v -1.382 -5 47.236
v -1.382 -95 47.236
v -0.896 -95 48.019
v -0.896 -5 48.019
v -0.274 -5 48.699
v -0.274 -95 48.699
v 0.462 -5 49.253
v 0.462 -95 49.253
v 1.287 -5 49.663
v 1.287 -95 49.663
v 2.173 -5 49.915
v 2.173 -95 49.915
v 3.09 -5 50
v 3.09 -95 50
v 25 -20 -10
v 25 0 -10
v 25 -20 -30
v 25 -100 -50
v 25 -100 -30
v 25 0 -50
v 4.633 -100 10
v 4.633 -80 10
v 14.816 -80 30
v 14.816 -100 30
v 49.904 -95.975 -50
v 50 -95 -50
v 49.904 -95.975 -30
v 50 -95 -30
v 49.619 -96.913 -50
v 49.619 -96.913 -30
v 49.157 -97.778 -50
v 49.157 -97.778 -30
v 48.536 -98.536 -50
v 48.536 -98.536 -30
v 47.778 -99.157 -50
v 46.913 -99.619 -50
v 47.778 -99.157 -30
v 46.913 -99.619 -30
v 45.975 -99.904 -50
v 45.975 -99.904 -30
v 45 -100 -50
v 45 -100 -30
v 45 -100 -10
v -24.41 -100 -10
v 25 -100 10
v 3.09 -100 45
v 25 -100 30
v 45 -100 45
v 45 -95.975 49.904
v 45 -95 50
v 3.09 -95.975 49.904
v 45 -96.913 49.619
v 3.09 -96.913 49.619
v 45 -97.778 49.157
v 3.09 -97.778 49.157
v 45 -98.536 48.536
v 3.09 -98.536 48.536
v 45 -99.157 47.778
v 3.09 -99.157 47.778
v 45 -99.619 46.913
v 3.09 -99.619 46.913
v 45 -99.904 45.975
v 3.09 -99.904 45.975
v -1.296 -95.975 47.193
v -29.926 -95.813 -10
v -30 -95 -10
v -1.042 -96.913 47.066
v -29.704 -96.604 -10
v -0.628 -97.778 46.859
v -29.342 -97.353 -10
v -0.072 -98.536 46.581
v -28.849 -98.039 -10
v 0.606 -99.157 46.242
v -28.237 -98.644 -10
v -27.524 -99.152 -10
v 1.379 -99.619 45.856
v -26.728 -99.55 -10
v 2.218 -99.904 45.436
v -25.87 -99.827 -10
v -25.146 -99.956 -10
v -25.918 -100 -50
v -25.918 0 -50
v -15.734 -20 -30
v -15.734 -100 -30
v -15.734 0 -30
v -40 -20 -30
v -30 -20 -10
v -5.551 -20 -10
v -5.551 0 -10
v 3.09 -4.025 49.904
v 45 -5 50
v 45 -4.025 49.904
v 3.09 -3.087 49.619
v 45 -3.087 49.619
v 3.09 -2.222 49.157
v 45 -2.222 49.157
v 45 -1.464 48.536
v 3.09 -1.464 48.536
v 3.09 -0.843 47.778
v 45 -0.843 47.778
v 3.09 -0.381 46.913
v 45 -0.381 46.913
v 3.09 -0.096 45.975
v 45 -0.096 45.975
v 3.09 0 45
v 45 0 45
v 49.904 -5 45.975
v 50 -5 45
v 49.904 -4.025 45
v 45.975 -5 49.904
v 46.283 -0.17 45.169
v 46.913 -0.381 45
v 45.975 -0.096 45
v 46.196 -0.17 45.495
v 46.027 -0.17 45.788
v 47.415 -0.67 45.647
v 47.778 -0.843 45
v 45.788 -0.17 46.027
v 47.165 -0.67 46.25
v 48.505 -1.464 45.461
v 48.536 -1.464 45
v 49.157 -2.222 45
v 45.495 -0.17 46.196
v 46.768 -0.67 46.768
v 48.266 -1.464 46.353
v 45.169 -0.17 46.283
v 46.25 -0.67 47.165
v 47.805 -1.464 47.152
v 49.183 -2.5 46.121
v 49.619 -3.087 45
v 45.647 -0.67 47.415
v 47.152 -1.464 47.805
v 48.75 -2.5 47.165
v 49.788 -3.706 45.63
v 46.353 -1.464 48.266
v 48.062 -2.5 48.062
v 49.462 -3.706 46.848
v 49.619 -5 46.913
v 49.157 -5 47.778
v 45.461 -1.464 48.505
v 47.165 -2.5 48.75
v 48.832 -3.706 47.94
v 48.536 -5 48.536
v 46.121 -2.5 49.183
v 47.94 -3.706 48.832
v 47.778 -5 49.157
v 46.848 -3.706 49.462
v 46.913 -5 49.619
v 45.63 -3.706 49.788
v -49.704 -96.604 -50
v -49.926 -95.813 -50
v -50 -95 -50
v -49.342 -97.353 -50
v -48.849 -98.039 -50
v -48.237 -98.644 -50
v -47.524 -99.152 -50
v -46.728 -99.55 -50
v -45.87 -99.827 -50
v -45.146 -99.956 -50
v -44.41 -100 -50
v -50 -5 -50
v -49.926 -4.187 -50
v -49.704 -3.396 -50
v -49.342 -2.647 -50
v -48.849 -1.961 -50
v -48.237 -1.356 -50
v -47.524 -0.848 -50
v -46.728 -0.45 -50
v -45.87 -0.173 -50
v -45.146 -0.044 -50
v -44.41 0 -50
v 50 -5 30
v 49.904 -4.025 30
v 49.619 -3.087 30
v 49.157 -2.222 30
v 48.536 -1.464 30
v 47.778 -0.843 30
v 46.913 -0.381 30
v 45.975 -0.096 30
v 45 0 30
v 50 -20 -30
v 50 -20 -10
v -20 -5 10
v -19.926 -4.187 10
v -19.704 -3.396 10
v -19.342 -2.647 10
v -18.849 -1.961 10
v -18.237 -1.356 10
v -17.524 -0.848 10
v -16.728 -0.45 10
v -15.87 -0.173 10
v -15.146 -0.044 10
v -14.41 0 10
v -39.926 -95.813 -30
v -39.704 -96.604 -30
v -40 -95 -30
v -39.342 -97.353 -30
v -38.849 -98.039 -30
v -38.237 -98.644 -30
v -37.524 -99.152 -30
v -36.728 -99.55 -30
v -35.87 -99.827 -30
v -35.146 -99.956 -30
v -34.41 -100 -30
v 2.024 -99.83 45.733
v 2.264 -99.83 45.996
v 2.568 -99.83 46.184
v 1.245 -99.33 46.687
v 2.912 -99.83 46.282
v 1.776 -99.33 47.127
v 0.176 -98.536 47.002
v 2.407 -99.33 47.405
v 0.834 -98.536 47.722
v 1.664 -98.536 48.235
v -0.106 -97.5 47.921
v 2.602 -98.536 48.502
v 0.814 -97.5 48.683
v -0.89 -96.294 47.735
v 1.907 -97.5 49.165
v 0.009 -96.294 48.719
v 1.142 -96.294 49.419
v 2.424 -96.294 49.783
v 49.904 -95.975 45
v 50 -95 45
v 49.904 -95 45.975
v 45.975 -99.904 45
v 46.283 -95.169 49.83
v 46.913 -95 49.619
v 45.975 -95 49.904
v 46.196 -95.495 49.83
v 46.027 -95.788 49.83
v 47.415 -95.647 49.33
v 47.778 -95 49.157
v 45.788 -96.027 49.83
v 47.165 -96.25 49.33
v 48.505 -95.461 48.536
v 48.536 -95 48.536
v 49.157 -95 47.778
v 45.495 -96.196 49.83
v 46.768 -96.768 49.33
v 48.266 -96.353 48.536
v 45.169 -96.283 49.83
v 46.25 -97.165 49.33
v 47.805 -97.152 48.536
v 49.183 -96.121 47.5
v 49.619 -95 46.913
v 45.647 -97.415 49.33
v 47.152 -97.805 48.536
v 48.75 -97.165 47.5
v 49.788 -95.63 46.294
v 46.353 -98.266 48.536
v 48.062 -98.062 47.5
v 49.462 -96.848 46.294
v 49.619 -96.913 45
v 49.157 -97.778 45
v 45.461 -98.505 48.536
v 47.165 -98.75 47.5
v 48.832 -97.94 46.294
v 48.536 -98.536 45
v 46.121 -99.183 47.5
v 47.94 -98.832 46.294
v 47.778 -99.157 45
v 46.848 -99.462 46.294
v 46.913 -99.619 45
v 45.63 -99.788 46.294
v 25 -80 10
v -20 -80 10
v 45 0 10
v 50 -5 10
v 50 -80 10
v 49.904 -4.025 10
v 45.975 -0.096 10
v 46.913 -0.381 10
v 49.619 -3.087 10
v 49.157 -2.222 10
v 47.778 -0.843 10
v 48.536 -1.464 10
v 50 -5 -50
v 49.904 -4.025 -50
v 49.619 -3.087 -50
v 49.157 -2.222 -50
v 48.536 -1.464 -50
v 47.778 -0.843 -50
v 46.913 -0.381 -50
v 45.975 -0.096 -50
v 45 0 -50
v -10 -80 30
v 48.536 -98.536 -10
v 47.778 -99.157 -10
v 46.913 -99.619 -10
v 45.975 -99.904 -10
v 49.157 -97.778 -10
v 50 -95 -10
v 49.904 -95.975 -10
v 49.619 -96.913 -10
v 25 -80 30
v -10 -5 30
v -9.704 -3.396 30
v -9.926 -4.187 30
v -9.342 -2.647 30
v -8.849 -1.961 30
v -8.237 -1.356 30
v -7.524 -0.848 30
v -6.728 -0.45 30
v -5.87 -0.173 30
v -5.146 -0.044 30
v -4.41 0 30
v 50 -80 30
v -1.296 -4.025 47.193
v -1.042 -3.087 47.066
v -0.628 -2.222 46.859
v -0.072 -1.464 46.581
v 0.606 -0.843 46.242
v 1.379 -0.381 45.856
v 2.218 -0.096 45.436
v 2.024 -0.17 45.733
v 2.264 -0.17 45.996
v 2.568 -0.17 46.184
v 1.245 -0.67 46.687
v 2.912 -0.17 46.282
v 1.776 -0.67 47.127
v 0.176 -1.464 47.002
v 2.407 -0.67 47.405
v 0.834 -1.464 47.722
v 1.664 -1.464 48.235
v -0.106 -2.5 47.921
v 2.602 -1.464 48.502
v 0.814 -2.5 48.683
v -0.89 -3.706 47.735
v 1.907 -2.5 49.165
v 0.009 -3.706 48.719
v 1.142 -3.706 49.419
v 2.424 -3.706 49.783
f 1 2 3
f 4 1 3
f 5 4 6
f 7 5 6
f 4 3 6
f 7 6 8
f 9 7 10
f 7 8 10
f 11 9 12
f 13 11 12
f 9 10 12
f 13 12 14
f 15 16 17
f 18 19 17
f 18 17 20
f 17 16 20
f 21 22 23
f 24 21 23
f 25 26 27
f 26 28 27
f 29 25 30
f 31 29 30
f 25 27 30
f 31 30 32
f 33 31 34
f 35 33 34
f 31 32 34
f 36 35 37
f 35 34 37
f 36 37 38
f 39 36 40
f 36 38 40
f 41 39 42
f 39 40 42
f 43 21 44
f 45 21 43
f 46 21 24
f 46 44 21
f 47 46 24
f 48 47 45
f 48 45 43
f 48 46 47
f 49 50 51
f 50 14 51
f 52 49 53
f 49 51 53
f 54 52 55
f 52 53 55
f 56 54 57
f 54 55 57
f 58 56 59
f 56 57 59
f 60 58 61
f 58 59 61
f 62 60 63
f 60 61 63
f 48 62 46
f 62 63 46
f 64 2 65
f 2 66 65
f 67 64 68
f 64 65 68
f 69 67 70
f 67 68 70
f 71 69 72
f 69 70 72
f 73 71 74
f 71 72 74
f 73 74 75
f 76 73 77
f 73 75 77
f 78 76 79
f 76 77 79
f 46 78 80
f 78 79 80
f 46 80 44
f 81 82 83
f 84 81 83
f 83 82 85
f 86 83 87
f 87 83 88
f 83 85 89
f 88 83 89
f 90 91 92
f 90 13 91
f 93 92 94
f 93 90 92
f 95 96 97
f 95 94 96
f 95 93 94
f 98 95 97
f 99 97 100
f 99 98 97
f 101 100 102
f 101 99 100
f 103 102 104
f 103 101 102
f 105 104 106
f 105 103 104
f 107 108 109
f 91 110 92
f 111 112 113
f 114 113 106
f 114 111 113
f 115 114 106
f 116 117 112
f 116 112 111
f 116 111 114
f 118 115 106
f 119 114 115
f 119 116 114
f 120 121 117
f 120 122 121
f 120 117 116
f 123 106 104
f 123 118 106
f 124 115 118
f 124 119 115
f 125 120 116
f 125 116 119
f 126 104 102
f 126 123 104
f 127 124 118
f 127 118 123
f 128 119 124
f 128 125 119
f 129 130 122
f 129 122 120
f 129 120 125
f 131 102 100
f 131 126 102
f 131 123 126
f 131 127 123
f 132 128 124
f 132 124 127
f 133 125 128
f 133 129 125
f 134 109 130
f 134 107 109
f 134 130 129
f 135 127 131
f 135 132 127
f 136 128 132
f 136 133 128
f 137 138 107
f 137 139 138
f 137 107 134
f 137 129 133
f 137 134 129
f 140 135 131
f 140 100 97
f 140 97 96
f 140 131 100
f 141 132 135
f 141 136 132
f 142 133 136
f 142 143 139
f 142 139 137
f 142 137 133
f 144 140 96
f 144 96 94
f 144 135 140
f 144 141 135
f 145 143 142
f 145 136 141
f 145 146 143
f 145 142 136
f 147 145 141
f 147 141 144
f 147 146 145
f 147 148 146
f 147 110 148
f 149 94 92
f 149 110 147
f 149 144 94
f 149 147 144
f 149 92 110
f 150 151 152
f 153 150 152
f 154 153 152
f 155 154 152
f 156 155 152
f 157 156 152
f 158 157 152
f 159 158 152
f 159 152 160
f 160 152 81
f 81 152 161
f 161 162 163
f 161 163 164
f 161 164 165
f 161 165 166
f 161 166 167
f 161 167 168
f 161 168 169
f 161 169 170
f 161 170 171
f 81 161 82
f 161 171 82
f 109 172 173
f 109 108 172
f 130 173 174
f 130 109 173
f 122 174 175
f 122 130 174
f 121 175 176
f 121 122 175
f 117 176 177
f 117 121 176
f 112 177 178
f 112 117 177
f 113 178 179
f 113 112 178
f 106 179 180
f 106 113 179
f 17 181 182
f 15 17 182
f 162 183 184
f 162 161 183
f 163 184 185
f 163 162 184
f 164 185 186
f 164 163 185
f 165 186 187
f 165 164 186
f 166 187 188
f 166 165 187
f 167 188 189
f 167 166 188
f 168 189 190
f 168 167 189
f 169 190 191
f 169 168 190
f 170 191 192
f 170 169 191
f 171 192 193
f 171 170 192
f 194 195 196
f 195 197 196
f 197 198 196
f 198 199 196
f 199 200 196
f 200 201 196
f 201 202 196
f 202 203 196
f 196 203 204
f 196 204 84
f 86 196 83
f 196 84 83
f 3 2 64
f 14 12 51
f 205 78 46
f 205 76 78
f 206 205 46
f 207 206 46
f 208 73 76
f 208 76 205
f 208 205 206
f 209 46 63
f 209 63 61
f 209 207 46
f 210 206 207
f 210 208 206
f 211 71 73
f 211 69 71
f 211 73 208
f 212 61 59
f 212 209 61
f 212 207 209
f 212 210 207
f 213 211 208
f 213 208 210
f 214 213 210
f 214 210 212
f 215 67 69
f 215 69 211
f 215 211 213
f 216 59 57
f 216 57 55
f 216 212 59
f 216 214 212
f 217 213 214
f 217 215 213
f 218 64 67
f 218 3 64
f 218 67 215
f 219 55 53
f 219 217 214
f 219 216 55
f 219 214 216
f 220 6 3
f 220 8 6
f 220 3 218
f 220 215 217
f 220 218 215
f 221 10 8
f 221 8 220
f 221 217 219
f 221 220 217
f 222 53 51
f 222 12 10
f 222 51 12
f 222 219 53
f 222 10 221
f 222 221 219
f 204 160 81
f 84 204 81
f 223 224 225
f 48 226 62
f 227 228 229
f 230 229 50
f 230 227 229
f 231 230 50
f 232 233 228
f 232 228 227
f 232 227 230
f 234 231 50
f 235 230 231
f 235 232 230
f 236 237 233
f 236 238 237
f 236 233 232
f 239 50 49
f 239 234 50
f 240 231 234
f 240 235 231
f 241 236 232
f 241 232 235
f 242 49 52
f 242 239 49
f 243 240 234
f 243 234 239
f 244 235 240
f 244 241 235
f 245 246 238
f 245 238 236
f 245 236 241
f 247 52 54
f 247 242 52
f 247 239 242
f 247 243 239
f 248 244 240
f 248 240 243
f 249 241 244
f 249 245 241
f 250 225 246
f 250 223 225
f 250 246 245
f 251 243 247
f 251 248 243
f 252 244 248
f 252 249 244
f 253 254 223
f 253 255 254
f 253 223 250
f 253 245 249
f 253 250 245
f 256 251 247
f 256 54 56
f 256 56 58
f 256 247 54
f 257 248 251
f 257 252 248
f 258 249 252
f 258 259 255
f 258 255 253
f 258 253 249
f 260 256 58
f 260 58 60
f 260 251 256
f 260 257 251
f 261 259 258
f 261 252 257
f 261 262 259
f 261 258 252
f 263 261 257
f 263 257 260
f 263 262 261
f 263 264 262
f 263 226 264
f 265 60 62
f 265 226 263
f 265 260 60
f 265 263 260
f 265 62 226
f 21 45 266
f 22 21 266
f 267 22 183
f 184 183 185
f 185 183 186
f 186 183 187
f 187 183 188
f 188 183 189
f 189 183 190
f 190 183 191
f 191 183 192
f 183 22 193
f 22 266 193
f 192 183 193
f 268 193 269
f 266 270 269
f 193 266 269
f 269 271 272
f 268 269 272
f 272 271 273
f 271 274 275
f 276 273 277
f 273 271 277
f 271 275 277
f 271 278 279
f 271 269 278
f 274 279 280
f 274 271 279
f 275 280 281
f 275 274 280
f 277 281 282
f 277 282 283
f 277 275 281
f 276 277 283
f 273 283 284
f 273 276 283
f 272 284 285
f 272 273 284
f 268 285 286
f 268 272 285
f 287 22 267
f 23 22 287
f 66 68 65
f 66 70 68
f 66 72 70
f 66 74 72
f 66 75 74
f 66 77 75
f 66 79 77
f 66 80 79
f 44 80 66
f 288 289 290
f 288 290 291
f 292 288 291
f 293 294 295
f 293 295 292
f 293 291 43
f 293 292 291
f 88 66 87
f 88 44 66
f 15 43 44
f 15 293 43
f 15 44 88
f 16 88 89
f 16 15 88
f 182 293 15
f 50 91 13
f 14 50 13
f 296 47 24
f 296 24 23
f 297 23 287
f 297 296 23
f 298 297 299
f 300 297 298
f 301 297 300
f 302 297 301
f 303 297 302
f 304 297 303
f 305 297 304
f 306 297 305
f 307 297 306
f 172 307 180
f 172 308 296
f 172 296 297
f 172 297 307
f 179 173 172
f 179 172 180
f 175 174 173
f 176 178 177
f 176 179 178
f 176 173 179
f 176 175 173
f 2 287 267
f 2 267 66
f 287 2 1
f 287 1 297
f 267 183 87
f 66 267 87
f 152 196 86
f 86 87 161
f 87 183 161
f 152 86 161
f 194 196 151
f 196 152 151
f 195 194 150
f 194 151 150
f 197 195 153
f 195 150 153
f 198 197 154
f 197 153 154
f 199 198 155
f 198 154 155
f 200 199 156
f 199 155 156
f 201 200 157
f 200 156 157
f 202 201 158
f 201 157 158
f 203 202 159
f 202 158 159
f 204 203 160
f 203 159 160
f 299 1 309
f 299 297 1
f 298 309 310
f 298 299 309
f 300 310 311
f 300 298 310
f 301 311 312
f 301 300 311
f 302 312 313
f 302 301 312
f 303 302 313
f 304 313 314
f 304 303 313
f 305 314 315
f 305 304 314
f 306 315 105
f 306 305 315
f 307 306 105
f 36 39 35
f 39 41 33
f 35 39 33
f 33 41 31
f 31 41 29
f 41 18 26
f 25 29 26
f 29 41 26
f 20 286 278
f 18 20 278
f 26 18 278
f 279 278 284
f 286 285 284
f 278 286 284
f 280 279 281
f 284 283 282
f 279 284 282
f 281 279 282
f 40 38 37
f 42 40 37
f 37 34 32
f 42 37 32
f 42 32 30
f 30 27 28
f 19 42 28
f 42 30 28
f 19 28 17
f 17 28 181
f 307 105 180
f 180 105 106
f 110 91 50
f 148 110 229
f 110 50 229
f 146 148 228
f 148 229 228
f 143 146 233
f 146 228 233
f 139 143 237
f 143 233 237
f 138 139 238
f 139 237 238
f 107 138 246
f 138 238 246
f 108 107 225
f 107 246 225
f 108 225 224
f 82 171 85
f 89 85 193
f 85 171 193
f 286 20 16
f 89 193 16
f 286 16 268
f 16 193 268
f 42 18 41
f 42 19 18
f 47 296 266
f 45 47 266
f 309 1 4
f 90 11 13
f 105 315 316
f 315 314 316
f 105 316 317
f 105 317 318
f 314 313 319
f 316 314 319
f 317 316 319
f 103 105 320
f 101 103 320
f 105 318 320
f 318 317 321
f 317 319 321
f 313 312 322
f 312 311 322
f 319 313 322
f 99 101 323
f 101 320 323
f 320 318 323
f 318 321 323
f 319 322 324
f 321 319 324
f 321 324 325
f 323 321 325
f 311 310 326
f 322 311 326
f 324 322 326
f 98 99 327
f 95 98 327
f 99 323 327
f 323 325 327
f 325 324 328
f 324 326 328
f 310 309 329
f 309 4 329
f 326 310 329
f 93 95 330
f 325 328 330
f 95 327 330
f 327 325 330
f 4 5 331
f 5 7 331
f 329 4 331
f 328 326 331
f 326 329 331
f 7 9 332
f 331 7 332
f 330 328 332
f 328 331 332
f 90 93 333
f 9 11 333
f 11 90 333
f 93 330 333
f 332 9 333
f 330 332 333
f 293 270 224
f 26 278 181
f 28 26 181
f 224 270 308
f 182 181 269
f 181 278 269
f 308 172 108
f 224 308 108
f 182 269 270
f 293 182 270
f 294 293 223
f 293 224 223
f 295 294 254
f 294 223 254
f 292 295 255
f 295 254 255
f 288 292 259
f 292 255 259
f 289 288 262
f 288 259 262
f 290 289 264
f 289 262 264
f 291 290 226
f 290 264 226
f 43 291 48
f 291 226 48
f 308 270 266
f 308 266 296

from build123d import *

# Parameters (mm, degrees)
F1_DEPTH = 100
F2_W     = 80
F2_H     = 20
F3_DEPTH = 100
F4_W     = 80
F4_H     = 20
F5_DEPTH = 100
F6_R     = 5


with BuildPart() as f1:
    # F0 (on Front) → F1 (new body)
    with BuildSketch(Plane.XZ):
        Polygon((0, 50), (-50, -50), (-25.9177014232, -50), (-15.7341611385, -30), (-5.5506208539, -10), (25, -10), (25, -30), (25, -50), (50, -50), (50, -30), (50, -10), (50, 10), (50, 30), (50, 50), (25, 50), align=None)
        Polygon((14.8164597154, 30), (25, 30), (25, 10), (4.6329194307, 10), align=None, mode=Mode.SUBTRACT)
    extrude(amount=F1_DEPTH)

    # F2 (on face) → F3 (cut)
    with BuildSketch(Plane.YZ.offset(50)):
        with Locations((-60, -20)):
            Rectangle(F2_W, F2_H)
    extrude(amount=-F3_DEPTH, mode=Mode.SUBTRACT)

    # F4 (on face) → F5 (cut)
    with BuildSketch(Plane.YZ.offset(50)):
        with Locations((-40, 20)):
            Rectangle(F4_W, F4_H)
    extrude(amount=-F5_DEPTH, mode=Mode.SUBTRACT)

    # F6
    f6_edges = [f1.edges().sort_by_distance(p)[0] for p in [
        (50, -100, -40),
        (50, -100, 20),
        (50, -50, 50),
        (25, -100, 50),
        (0, -50, 50),
        (-15, -100, 20),
        (-45, -100, -40),
        (50, 0, -20),
        (50, 0, 40),
        (-35, 0, -20),
        (-5, 0, 40),
        (25, 0, 50),
    ]]
    fillet(f6_edges, radius=F6_R)


solid = f1.part
